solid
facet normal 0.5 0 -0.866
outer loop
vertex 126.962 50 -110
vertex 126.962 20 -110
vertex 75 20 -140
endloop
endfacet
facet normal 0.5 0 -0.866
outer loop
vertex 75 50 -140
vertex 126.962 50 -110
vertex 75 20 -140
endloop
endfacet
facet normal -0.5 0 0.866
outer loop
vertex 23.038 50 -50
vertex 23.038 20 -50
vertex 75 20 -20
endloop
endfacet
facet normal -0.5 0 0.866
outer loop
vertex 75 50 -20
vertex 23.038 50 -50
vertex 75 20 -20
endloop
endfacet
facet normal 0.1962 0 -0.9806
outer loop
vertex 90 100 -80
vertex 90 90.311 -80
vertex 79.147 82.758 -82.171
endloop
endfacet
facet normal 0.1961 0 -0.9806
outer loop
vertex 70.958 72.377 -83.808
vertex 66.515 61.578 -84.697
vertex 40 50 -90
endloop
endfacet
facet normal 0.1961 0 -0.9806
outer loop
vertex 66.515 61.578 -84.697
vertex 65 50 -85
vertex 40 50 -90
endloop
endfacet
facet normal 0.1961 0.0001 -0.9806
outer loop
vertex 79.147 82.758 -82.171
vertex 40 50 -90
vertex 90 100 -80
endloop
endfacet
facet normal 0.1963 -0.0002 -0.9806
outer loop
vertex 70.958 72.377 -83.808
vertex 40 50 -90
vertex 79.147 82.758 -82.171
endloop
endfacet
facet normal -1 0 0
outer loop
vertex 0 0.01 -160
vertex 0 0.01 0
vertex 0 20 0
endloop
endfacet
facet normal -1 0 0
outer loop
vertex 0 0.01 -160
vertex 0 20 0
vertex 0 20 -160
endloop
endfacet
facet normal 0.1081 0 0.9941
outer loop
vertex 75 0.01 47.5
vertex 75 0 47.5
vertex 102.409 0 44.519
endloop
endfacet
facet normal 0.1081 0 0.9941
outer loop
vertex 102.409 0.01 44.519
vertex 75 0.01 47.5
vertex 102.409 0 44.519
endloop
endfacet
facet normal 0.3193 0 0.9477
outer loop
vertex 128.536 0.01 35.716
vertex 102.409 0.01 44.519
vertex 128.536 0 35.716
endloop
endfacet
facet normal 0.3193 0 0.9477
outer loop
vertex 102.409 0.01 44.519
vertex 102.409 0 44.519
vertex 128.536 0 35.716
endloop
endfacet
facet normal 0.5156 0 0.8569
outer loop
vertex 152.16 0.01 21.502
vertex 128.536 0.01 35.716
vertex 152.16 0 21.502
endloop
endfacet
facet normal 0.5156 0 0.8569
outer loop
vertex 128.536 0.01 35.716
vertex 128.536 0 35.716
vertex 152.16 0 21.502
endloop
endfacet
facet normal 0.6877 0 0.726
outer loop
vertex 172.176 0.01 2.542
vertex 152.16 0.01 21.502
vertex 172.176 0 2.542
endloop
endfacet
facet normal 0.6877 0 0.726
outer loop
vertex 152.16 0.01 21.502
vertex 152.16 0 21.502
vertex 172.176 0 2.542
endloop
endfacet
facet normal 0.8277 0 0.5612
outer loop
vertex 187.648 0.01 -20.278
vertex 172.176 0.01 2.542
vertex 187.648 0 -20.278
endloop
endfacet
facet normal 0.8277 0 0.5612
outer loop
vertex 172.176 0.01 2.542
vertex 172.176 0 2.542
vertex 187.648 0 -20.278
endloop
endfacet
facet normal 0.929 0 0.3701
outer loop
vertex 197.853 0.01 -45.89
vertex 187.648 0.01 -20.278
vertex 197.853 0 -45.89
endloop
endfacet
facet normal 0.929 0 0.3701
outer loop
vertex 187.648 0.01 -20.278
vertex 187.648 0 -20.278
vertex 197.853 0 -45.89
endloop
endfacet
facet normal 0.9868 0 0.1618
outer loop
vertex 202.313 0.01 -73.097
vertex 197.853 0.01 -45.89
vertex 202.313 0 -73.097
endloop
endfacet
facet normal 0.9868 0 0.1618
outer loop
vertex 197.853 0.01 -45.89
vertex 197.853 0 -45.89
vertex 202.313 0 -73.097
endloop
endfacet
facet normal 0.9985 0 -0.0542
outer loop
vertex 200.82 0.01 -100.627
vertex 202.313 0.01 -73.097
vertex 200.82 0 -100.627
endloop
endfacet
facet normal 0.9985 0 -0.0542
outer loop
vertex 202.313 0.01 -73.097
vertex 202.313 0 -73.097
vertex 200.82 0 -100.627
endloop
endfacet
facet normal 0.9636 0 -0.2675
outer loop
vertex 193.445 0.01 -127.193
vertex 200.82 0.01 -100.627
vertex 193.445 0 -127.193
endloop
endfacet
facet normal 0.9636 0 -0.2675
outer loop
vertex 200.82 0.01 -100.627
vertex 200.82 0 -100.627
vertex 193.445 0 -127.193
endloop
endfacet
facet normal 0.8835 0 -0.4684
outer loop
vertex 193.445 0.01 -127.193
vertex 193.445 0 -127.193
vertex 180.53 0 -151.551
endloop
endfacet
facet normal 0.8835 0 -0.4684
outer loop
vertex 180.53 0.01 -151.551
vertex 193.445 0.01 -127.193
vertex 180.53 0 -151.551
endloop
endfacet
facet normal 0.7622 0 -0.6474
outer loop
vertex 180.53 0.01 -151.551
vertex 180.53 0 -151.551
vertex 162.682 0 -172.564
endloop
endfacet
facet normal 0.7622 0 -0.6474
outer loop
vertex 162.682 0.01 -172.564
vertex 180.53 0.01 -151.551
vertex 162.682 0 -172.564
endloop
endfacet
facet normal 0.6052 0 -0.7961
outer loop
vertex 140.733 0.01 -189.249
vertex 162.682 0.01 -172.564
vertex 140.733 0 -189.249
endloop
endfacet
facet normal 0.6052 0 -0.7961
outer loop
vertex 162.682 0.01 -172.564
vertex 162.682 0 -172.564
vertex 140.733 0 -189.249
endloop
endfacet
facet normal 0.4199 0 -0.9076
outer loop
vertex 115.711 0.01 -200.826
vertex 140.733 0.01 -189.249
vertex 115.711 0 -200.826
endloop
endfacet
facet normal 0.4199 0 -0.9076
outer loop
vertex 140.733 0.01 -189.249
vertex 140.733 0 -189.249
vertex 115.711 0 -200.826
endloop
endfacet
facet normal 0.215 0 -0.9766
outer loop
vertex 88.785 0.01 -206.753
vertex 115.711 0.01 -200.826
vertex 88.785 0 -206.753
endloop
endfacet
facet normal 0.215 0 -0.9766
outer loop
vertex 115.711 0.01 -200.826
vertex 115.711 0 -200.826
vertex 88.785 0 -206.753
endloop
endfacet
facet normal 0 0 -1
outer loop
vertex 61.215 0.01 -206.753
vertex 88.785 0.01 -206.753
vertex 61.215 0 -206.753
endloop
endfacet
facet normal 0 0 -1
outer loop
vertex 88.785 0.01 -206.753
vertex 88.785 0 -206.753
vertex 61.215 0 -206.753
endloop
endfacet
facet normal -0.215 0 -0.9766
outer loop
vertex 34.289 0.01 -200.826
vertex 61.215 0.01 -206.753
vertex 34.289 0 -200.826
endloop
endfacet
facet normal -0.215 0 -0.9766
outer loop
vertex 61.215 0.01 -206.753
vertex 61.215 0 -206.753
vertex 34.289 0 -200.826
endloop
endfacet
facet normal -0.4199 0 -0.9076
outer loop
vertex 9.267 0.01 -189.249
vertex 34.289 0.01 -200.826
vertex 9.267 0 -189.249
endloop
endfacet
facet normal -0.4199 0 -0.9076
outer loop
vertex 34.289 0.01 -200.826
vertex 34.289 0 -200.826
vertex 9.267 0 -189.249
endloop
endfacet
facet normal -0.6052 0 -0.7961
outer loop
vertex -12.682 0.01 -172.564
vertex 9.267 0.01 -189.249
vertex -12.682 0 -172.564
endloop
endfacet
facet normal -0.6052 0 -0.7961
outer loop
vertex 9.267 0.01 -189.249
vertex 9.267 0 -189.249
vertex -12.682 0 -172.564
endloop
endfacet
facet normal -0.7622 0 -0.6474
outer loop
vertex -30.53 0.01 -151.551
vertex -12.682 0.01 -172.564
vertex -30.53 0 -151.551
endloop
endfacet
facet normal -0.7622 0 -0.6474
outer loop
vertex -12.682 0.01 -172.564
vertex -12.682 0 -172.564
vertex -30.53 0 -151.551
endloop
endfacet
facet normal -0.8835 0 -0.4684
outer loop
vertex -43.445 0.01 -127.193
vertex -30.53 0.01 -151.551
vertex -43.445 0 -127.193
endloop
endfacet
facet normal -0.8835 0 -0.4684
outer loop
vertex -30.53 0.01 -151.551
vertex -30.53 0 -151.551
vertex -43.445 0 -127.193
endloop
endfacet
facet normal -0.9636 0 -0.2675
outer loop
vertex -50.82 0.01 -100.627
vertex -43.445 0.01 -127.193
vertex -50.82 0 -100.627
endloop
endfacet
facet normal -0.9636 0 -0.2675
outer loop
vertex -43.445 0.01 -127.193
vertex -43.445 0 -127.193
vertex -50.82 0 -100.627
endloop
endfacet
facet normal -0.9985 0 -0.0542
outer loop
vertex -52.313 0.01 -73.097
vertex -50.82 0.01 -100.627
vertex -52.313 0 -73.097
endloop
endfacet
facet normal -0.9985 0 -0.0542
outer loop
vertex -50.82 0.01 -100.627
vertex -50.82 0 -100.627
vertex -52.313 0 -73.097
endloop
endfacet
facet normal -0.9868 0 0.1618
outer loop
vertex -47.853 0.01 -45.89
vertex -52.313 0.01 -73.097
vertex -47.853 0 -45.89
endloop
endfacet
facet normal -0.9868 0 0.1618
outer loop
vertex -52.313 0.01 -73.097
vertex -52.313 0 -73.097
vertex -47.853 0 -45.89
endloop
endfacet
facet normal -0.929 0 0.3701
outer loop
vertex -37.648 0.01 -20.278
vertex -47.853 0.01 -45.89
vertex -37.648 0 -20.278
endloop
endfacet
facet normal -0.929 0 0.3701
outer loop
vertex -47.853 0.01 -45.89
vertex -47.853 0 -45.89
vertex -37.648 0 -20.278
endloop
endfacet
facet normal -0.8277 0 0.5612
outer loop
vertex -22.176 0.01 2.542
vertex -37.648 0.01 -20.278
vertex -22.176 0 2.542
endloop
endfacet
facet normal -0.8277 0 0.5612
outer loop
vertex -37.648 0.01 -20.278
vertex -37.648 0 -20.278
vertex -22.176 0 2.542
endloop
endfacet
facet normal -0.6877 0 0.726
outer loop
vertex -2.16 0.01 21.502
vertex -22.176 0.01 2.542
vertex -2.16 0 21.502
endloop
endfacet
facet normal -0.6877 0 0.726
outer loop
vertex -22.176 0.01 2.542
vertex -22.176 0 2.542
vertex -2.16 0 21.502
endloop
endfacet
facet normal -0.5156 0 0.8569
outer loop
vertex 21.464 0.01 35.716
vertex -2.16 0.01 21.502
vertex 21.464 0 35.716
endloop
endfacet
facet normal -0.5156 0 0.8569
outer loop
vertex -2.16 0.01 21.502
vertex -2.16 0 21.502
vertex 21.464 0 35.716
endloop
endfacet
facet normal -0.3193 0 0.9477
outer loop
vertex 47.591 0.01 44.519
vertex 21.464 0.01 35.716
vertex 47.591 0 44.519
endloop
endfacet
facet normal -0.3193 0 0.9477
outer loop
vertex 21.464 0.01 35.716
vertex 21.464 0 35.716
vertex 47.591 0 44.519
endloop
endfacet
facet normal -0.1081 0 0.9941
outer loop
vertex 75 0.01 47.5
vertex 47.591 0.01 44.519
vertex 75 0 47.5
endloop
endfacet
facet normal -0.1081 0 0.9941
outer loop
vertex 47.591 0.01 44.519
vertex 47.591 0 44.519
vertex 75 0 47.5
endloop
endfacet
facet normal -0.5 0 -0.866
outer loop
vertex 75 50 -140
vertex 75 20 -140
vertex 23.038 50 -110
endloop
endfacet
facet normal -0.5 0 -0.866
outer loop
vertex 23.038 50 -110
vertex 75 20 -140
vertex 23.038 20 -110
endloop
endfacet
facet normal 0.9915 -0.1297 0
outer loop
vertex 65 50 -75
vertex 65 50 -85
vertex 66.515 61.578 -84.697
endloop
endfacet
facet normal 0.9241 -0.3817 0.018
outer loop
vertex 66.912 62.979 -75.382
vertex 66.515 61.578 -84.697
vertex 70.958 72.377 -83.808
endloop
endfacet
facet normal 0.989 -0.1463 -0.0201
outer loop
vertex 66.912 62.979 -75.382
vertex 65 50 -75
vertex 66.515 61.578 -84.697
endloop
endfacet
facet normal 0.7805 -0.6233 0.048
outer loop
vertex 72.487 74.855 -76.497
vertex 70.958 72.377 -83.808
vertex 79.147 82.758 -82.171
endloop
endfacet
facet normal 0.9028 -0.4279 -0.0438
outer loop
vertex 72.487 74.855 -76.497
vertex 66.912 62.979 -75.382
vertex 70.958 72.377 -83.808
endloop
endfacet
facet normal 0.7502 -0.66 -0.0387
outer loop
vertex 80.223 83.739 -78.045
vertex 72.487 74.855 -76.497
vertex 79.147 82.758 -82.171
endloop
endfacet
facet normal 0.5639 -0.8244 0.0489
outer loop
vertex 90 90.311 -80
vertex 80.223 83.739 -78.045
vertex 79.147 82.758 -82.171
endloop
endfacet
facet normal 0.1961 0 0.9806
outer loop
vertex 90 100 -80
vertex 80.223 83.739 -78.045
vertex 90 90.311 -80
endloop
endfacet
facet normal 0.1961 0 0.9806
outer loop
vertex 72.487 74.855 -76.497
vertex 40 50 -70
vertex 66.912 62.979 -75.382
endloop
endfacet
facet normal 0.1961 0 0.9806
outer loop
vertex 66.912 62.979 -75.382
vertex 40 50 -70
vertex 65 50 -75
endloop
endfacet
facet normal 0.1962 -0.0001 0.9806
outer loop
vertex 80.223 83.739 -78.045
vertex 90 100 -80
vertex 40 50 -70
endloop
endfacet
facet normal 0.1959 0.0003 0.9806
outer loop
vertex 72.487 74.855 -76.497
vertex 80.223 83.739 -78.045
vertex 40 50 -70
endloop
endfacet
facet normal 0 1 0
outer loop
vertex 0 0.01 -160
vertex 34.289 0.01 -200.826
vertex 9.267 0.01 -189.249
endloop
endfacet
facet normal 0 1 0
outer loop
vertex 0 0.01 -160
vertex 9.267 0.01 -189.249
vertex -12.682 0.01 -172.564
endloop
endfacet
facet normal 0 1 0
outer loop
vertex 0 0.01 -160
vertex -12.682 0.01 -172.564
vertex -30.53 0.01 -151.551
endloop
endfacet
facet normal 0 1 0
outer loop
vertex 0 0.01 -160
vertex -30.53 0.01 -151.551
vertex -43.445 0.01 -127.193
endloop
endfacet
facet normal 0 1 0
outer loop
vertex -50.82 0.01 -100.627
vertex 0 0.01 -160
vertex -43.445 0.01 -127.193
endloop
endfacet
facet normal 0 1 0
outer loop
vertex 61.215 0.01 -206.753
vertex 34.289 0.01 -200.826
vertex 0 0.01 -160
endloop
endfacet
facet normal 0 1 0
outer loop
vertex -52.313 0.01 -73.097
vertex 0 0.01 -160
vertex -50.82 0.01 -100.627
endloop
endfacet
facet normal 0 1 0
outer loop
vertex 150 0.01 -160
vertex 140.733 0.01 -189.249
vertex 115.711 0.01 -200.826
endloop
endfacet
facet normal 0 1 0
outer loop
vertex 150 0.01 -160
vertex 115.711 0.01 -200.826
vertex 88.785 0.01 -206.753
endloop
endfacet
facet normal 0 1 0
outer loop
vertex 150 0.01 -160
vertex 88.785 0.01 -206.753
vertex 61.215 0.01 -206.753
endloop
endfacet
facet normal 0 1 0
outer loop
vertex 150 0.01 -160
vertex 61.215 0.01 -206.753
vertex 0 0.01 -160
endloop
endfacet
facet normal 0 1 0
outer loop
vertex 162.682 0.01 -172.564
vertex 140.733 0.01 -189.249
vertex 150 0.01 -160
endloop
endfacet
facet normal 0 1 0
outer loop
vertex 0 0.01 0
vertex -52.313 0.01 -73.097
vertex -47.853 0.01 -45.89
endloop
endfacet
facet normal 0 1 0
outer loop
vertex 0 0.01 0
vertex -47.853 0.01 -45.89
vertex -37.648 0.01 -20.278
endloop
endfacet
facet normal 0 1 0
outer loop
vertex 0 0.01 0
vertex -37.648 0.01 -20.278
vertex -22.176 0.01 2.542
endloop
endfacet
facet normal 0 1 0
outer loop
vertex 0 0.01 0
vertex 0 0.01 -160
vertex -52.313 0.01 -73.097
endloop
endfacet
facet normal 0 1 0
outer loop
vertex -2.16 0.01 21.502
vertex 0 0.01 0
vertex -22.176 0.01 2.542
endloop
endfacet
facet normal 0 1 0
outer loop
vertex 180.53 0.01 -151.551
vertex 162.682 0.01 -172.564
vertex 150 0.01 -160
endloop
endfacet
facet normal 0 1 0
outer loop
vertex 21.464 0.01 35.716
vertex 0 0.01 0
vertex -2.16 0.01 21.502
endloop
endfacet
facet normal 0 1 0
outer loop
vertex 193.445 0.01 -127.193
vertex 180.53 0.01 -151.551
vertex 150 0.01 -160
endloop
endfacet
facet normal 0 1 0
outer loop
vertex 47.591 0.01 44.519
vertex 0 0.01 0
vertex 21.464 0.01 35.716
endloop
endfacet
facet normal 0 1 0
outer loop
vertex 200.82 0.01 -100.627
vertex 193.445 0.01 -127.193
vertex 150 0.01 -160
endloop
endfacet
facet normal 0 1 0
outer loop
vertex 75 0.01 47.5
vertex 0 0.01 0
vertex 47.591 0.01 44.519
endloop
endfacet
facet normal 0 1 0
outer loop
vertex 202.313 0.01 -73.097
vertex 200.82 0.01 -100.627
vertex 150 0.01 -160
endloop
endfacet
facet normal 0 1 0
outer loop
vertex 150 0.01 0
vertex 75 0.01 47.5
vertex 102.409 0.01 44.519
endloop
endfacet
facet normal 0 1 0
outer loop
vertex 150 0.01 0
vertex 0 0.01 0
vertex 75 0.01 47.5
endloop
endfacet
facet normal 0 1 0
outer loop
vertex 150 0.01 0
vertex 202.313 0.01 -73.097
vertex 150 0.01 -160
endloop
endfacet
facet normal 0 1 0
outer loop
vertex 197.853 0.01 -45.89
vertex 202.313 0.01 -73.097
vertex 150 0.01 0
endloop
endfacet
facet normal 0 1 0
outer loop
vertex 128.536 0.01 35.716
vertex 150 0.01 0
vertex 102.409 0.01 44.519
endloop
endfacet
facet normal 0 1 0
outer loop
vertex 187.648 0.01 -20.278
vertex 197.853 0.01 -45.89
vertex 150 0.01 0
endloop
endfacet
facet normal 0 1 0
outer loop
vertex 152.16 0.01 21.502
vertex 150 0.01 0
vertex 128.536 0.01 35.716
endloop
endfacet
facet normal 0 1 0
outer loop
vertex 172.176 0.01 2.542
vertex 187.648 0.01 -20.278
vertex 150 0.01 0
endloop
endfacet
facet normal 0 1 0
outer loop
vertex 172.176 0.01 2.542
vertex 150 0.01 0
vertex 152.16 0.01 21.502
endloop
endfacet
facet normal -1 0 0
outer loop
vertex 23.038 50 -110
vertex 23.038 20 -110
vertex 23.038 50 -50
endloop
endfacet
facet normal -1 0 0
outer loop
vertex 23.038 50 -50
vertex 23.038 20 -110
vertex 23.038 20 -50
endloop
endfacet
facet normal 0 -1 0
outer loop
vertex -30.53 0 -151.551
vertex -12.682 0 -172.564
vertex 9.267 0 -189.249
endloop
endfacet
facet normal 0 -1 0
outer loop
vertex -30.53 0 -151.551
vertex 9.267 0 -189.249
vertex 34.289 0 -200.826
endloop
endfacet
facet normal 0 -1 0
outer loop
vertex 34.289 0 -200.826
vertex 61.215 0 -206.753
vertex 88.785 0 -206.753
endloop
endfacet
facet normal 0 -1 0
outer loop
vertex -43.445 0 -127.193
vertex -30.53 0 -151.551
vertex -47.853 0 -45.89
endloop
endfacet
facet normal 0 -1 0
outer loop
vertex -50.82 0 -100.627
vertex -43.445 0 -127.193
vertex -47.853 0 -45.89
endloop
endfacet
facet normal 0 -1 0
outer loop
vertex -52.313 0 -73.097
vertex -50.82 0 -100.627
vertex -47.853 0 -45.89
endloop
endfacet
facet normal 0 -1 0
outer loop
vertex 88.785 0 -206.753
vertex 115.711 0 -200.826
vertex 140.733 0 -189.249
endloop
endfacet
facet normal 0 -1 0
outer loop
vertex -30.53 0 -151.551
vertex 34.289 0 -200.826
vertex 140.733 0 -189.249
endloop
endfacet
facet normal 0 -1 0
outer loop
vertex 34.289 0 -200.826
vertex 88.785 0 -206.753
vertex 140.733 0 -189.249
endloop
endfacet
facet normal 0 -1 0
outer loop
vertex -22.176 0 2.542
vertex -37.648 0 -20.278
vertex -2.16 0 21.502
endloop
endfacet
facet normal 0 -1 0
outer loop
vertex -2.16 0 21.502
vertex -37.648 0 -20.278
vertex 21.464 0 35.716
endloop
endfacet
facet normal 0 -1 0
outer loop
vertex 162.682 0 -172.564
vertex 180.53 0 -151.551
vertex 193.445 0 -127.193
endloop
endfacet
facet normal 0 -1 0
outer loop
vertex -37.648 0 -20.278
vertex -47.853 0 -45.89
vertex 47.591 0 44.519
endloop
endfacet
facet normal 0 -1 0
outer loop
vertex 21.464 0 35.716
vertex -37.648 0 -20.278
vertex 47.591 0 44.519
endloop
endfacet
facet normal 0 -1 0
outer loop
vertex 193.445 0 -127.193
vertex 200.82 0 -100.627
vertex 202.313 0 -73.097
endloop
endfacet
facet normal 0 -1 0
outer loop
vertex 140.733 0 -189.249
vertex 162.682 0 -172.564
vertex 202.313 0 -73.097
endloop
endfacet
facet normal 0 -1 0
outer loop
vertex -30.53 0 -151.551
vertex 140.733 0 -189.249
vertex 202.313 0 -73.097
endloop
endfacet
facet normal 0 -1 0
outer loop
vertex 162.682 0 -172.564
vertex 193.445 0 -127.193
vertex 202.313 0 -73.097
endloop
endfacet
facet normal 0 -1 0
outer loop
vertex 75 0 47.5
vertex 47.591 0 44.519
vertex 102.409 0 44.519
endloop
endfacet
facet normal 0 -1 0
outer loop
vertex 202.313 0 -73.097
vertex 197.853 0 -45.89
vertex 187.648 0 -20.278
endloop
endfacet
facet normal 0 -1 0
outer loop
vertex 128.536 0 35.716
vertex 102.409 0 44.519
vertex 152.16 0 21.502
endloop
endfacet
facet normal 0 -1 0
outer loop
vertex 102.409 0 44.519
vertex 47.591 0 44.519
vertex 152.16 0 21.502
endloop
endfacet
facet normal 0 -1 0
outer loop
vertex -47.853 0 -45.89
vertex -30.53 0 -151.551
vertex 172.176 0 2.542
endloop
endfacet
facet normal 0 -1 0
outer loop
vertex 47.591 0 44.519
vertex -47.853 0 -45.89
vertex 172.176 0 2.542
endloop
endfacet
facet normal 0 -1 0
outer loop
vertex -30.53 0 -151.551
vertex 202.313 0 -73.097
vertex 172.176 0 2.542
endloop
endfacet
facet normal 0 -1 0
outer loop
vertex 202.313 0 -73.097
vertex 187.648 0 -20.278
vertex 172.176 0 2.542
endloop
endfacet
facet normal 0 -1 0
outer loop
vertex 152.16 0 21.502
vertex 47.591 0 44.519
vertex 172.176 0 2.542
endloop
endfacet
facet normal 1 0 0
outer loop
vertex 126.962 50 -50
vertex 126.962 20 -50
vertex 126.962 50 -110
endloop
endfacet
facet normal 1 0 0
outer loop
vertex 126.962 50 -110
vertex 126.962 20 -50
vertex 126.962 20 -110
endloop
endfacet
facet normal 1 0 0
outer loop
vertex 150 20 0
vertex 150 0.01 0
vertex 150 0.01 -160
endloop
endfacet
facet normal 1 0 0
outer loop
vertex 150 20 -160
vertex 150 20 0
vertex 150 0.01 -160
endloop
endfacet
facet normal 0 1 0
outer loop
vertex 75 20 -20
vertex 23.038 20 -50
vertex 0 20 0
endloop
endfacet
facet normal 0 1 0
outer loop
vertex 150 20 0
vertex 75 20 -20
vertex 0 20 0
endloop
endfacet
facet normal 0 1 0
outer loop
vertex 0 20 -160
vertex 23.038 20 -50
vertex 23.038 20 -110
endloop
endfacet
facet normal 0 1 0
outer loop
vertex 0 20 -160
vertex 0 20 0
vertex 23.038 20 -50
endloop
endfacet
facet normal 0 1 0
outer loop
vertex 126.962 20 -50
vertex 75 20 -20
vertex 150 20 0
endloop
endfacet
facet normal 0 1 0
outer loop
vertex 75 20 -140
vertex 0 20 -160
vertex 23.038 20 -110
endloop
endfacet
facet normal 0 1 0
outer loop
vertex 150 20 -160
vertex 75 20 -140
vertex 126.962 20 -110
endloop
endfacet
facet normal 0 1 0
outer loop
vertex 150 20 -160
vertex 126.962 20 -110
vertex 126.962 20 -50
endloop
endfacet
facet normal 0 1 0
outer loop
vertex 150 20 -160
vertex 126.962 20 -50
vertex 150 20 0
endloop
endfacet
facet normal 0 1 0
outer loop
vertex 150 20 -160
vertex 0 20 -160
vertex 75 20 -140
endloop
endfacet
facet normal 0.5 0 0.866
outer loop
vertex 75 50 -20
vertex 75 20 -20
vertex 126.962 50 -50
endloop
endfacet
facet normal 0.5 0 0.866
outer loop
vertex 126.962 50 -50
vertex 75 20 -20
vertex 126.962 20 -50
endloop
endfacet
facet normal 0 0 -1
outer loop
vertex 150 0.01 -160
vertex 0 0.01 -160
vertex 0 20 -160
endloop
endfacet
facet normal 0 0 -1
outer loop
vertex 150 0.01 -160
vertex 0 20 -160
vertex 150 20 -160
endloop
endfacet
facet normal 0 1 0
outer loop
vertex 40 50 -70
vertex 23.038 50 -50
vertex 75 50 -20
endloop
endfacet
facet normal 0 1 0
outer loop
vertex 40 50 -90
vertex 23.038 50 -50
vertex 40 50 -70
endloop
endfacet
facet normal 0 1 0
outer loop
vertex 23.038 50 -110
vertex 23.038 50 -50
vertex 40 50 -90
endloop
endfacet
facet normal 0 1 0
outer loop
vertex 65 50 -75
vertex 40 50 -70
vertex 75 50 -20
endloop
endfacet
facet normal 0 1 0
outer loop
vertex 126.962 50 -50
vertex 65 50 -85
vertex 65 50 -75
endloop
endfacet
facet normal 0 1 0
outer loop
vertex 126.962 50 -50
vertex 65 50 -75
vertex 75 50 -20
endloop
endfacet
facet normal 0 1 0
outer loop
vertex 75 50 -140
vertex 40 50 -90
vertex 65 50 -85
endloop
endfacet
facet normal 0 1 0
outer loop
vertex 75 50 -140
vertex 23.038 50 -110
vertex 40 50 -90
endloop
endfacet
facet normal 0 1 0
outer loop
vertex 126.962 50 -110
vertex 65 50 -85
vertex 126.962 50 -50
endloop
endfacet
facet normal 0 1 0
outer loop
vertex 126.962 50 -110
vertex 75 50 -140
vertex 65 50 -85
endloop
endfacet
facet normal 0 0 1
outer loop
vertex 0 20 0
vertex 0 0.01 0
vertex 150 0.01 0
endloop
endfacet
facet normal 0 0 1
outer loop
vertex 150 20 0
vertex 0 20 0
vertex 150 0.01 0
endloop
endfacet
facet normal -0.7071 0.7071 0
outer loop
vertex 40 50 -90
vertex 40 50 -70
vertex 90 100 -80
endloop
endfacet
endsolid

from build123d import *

# Parameters (mm, degrees)
SKETCH1_W      = 150
SKETCH1_H      = 160
EXTRUDE1_DEPTH = 20
EXTRUDE2_DEPTH = 30
EXTRUDE3_DEPTH = 50
EXTRUDE4_DEPTH = 161
SKETCH5_R      = 127.5
EXTRUDE5_DEPTH = 0.01


with BuildPart() as part:
    # Sketch1 → Extrude1 (new body)
    with BuildSketch(Plane(origin=(0, 0, 0), x_dir=(1, 0, 0), z_dir=(0, 1, 0))):
        with Locations((75, 80)):
            Rectangle(SKETCH1_W, SKETCH1_H)
    extrude(amount=EXTRUDE1_DEPTH)

    # Sketch2 → Extrude2 (add)
    with BuildSketch(Plane(origin=(0, 20, 0), x_dir=(1, 0, 0), z_dir=(0, 1, 0))):
        Polygon((75, 140), (23.038475773, 110), (23.038475773, 50), (75, 20), (126.961524227, 50), (126.961524227, 110), align=None)
    extrude(amount=EXTRUDE2_DEPTH)

    # Sketch3 → Extrude3 (add)
    with BuildSketch(Plane(origin=(0, 50, 0), x_dir=(1, 0, 0), z_dir=(0, 1, 0))):
        Polygon((40, 90), (40, 70), (90, 80), align=None)
    extrude(amount=EXTRUDE3_DEPTH)

    # Sketch4 → Extrude4 (cut, through all)
    with BuildSketch(Plane.XY):
        with BuildLine():
            Line((110, 95), (110, 50))
            Line((110, 50), (65, 50))
            ThreePointArc((65, 50), (78.180194847, 81.819805153), (110, 95))
        make_face()
        Polygon((40, 50), (90, 100), (40, 100), align=None)
    extrude(amount=-EXTRUDE4_DEPTH, mode=Mode.SUBTRACT)

    # Sketch5 → Extrude5 (add)
    with BuildSketch(Plane(origin=(0, 0, 0), x_dir=(1, 0, 0), z_dir=(0, 1, 0))):
        with Locations(Location((75, 80, 0), (0, 0, 270))):  # turned: the seam where the file's is
            Circle(SKETCH5_R)
    extrude(amount=EXTRUDE5_DEPTH)


solid = part.part
